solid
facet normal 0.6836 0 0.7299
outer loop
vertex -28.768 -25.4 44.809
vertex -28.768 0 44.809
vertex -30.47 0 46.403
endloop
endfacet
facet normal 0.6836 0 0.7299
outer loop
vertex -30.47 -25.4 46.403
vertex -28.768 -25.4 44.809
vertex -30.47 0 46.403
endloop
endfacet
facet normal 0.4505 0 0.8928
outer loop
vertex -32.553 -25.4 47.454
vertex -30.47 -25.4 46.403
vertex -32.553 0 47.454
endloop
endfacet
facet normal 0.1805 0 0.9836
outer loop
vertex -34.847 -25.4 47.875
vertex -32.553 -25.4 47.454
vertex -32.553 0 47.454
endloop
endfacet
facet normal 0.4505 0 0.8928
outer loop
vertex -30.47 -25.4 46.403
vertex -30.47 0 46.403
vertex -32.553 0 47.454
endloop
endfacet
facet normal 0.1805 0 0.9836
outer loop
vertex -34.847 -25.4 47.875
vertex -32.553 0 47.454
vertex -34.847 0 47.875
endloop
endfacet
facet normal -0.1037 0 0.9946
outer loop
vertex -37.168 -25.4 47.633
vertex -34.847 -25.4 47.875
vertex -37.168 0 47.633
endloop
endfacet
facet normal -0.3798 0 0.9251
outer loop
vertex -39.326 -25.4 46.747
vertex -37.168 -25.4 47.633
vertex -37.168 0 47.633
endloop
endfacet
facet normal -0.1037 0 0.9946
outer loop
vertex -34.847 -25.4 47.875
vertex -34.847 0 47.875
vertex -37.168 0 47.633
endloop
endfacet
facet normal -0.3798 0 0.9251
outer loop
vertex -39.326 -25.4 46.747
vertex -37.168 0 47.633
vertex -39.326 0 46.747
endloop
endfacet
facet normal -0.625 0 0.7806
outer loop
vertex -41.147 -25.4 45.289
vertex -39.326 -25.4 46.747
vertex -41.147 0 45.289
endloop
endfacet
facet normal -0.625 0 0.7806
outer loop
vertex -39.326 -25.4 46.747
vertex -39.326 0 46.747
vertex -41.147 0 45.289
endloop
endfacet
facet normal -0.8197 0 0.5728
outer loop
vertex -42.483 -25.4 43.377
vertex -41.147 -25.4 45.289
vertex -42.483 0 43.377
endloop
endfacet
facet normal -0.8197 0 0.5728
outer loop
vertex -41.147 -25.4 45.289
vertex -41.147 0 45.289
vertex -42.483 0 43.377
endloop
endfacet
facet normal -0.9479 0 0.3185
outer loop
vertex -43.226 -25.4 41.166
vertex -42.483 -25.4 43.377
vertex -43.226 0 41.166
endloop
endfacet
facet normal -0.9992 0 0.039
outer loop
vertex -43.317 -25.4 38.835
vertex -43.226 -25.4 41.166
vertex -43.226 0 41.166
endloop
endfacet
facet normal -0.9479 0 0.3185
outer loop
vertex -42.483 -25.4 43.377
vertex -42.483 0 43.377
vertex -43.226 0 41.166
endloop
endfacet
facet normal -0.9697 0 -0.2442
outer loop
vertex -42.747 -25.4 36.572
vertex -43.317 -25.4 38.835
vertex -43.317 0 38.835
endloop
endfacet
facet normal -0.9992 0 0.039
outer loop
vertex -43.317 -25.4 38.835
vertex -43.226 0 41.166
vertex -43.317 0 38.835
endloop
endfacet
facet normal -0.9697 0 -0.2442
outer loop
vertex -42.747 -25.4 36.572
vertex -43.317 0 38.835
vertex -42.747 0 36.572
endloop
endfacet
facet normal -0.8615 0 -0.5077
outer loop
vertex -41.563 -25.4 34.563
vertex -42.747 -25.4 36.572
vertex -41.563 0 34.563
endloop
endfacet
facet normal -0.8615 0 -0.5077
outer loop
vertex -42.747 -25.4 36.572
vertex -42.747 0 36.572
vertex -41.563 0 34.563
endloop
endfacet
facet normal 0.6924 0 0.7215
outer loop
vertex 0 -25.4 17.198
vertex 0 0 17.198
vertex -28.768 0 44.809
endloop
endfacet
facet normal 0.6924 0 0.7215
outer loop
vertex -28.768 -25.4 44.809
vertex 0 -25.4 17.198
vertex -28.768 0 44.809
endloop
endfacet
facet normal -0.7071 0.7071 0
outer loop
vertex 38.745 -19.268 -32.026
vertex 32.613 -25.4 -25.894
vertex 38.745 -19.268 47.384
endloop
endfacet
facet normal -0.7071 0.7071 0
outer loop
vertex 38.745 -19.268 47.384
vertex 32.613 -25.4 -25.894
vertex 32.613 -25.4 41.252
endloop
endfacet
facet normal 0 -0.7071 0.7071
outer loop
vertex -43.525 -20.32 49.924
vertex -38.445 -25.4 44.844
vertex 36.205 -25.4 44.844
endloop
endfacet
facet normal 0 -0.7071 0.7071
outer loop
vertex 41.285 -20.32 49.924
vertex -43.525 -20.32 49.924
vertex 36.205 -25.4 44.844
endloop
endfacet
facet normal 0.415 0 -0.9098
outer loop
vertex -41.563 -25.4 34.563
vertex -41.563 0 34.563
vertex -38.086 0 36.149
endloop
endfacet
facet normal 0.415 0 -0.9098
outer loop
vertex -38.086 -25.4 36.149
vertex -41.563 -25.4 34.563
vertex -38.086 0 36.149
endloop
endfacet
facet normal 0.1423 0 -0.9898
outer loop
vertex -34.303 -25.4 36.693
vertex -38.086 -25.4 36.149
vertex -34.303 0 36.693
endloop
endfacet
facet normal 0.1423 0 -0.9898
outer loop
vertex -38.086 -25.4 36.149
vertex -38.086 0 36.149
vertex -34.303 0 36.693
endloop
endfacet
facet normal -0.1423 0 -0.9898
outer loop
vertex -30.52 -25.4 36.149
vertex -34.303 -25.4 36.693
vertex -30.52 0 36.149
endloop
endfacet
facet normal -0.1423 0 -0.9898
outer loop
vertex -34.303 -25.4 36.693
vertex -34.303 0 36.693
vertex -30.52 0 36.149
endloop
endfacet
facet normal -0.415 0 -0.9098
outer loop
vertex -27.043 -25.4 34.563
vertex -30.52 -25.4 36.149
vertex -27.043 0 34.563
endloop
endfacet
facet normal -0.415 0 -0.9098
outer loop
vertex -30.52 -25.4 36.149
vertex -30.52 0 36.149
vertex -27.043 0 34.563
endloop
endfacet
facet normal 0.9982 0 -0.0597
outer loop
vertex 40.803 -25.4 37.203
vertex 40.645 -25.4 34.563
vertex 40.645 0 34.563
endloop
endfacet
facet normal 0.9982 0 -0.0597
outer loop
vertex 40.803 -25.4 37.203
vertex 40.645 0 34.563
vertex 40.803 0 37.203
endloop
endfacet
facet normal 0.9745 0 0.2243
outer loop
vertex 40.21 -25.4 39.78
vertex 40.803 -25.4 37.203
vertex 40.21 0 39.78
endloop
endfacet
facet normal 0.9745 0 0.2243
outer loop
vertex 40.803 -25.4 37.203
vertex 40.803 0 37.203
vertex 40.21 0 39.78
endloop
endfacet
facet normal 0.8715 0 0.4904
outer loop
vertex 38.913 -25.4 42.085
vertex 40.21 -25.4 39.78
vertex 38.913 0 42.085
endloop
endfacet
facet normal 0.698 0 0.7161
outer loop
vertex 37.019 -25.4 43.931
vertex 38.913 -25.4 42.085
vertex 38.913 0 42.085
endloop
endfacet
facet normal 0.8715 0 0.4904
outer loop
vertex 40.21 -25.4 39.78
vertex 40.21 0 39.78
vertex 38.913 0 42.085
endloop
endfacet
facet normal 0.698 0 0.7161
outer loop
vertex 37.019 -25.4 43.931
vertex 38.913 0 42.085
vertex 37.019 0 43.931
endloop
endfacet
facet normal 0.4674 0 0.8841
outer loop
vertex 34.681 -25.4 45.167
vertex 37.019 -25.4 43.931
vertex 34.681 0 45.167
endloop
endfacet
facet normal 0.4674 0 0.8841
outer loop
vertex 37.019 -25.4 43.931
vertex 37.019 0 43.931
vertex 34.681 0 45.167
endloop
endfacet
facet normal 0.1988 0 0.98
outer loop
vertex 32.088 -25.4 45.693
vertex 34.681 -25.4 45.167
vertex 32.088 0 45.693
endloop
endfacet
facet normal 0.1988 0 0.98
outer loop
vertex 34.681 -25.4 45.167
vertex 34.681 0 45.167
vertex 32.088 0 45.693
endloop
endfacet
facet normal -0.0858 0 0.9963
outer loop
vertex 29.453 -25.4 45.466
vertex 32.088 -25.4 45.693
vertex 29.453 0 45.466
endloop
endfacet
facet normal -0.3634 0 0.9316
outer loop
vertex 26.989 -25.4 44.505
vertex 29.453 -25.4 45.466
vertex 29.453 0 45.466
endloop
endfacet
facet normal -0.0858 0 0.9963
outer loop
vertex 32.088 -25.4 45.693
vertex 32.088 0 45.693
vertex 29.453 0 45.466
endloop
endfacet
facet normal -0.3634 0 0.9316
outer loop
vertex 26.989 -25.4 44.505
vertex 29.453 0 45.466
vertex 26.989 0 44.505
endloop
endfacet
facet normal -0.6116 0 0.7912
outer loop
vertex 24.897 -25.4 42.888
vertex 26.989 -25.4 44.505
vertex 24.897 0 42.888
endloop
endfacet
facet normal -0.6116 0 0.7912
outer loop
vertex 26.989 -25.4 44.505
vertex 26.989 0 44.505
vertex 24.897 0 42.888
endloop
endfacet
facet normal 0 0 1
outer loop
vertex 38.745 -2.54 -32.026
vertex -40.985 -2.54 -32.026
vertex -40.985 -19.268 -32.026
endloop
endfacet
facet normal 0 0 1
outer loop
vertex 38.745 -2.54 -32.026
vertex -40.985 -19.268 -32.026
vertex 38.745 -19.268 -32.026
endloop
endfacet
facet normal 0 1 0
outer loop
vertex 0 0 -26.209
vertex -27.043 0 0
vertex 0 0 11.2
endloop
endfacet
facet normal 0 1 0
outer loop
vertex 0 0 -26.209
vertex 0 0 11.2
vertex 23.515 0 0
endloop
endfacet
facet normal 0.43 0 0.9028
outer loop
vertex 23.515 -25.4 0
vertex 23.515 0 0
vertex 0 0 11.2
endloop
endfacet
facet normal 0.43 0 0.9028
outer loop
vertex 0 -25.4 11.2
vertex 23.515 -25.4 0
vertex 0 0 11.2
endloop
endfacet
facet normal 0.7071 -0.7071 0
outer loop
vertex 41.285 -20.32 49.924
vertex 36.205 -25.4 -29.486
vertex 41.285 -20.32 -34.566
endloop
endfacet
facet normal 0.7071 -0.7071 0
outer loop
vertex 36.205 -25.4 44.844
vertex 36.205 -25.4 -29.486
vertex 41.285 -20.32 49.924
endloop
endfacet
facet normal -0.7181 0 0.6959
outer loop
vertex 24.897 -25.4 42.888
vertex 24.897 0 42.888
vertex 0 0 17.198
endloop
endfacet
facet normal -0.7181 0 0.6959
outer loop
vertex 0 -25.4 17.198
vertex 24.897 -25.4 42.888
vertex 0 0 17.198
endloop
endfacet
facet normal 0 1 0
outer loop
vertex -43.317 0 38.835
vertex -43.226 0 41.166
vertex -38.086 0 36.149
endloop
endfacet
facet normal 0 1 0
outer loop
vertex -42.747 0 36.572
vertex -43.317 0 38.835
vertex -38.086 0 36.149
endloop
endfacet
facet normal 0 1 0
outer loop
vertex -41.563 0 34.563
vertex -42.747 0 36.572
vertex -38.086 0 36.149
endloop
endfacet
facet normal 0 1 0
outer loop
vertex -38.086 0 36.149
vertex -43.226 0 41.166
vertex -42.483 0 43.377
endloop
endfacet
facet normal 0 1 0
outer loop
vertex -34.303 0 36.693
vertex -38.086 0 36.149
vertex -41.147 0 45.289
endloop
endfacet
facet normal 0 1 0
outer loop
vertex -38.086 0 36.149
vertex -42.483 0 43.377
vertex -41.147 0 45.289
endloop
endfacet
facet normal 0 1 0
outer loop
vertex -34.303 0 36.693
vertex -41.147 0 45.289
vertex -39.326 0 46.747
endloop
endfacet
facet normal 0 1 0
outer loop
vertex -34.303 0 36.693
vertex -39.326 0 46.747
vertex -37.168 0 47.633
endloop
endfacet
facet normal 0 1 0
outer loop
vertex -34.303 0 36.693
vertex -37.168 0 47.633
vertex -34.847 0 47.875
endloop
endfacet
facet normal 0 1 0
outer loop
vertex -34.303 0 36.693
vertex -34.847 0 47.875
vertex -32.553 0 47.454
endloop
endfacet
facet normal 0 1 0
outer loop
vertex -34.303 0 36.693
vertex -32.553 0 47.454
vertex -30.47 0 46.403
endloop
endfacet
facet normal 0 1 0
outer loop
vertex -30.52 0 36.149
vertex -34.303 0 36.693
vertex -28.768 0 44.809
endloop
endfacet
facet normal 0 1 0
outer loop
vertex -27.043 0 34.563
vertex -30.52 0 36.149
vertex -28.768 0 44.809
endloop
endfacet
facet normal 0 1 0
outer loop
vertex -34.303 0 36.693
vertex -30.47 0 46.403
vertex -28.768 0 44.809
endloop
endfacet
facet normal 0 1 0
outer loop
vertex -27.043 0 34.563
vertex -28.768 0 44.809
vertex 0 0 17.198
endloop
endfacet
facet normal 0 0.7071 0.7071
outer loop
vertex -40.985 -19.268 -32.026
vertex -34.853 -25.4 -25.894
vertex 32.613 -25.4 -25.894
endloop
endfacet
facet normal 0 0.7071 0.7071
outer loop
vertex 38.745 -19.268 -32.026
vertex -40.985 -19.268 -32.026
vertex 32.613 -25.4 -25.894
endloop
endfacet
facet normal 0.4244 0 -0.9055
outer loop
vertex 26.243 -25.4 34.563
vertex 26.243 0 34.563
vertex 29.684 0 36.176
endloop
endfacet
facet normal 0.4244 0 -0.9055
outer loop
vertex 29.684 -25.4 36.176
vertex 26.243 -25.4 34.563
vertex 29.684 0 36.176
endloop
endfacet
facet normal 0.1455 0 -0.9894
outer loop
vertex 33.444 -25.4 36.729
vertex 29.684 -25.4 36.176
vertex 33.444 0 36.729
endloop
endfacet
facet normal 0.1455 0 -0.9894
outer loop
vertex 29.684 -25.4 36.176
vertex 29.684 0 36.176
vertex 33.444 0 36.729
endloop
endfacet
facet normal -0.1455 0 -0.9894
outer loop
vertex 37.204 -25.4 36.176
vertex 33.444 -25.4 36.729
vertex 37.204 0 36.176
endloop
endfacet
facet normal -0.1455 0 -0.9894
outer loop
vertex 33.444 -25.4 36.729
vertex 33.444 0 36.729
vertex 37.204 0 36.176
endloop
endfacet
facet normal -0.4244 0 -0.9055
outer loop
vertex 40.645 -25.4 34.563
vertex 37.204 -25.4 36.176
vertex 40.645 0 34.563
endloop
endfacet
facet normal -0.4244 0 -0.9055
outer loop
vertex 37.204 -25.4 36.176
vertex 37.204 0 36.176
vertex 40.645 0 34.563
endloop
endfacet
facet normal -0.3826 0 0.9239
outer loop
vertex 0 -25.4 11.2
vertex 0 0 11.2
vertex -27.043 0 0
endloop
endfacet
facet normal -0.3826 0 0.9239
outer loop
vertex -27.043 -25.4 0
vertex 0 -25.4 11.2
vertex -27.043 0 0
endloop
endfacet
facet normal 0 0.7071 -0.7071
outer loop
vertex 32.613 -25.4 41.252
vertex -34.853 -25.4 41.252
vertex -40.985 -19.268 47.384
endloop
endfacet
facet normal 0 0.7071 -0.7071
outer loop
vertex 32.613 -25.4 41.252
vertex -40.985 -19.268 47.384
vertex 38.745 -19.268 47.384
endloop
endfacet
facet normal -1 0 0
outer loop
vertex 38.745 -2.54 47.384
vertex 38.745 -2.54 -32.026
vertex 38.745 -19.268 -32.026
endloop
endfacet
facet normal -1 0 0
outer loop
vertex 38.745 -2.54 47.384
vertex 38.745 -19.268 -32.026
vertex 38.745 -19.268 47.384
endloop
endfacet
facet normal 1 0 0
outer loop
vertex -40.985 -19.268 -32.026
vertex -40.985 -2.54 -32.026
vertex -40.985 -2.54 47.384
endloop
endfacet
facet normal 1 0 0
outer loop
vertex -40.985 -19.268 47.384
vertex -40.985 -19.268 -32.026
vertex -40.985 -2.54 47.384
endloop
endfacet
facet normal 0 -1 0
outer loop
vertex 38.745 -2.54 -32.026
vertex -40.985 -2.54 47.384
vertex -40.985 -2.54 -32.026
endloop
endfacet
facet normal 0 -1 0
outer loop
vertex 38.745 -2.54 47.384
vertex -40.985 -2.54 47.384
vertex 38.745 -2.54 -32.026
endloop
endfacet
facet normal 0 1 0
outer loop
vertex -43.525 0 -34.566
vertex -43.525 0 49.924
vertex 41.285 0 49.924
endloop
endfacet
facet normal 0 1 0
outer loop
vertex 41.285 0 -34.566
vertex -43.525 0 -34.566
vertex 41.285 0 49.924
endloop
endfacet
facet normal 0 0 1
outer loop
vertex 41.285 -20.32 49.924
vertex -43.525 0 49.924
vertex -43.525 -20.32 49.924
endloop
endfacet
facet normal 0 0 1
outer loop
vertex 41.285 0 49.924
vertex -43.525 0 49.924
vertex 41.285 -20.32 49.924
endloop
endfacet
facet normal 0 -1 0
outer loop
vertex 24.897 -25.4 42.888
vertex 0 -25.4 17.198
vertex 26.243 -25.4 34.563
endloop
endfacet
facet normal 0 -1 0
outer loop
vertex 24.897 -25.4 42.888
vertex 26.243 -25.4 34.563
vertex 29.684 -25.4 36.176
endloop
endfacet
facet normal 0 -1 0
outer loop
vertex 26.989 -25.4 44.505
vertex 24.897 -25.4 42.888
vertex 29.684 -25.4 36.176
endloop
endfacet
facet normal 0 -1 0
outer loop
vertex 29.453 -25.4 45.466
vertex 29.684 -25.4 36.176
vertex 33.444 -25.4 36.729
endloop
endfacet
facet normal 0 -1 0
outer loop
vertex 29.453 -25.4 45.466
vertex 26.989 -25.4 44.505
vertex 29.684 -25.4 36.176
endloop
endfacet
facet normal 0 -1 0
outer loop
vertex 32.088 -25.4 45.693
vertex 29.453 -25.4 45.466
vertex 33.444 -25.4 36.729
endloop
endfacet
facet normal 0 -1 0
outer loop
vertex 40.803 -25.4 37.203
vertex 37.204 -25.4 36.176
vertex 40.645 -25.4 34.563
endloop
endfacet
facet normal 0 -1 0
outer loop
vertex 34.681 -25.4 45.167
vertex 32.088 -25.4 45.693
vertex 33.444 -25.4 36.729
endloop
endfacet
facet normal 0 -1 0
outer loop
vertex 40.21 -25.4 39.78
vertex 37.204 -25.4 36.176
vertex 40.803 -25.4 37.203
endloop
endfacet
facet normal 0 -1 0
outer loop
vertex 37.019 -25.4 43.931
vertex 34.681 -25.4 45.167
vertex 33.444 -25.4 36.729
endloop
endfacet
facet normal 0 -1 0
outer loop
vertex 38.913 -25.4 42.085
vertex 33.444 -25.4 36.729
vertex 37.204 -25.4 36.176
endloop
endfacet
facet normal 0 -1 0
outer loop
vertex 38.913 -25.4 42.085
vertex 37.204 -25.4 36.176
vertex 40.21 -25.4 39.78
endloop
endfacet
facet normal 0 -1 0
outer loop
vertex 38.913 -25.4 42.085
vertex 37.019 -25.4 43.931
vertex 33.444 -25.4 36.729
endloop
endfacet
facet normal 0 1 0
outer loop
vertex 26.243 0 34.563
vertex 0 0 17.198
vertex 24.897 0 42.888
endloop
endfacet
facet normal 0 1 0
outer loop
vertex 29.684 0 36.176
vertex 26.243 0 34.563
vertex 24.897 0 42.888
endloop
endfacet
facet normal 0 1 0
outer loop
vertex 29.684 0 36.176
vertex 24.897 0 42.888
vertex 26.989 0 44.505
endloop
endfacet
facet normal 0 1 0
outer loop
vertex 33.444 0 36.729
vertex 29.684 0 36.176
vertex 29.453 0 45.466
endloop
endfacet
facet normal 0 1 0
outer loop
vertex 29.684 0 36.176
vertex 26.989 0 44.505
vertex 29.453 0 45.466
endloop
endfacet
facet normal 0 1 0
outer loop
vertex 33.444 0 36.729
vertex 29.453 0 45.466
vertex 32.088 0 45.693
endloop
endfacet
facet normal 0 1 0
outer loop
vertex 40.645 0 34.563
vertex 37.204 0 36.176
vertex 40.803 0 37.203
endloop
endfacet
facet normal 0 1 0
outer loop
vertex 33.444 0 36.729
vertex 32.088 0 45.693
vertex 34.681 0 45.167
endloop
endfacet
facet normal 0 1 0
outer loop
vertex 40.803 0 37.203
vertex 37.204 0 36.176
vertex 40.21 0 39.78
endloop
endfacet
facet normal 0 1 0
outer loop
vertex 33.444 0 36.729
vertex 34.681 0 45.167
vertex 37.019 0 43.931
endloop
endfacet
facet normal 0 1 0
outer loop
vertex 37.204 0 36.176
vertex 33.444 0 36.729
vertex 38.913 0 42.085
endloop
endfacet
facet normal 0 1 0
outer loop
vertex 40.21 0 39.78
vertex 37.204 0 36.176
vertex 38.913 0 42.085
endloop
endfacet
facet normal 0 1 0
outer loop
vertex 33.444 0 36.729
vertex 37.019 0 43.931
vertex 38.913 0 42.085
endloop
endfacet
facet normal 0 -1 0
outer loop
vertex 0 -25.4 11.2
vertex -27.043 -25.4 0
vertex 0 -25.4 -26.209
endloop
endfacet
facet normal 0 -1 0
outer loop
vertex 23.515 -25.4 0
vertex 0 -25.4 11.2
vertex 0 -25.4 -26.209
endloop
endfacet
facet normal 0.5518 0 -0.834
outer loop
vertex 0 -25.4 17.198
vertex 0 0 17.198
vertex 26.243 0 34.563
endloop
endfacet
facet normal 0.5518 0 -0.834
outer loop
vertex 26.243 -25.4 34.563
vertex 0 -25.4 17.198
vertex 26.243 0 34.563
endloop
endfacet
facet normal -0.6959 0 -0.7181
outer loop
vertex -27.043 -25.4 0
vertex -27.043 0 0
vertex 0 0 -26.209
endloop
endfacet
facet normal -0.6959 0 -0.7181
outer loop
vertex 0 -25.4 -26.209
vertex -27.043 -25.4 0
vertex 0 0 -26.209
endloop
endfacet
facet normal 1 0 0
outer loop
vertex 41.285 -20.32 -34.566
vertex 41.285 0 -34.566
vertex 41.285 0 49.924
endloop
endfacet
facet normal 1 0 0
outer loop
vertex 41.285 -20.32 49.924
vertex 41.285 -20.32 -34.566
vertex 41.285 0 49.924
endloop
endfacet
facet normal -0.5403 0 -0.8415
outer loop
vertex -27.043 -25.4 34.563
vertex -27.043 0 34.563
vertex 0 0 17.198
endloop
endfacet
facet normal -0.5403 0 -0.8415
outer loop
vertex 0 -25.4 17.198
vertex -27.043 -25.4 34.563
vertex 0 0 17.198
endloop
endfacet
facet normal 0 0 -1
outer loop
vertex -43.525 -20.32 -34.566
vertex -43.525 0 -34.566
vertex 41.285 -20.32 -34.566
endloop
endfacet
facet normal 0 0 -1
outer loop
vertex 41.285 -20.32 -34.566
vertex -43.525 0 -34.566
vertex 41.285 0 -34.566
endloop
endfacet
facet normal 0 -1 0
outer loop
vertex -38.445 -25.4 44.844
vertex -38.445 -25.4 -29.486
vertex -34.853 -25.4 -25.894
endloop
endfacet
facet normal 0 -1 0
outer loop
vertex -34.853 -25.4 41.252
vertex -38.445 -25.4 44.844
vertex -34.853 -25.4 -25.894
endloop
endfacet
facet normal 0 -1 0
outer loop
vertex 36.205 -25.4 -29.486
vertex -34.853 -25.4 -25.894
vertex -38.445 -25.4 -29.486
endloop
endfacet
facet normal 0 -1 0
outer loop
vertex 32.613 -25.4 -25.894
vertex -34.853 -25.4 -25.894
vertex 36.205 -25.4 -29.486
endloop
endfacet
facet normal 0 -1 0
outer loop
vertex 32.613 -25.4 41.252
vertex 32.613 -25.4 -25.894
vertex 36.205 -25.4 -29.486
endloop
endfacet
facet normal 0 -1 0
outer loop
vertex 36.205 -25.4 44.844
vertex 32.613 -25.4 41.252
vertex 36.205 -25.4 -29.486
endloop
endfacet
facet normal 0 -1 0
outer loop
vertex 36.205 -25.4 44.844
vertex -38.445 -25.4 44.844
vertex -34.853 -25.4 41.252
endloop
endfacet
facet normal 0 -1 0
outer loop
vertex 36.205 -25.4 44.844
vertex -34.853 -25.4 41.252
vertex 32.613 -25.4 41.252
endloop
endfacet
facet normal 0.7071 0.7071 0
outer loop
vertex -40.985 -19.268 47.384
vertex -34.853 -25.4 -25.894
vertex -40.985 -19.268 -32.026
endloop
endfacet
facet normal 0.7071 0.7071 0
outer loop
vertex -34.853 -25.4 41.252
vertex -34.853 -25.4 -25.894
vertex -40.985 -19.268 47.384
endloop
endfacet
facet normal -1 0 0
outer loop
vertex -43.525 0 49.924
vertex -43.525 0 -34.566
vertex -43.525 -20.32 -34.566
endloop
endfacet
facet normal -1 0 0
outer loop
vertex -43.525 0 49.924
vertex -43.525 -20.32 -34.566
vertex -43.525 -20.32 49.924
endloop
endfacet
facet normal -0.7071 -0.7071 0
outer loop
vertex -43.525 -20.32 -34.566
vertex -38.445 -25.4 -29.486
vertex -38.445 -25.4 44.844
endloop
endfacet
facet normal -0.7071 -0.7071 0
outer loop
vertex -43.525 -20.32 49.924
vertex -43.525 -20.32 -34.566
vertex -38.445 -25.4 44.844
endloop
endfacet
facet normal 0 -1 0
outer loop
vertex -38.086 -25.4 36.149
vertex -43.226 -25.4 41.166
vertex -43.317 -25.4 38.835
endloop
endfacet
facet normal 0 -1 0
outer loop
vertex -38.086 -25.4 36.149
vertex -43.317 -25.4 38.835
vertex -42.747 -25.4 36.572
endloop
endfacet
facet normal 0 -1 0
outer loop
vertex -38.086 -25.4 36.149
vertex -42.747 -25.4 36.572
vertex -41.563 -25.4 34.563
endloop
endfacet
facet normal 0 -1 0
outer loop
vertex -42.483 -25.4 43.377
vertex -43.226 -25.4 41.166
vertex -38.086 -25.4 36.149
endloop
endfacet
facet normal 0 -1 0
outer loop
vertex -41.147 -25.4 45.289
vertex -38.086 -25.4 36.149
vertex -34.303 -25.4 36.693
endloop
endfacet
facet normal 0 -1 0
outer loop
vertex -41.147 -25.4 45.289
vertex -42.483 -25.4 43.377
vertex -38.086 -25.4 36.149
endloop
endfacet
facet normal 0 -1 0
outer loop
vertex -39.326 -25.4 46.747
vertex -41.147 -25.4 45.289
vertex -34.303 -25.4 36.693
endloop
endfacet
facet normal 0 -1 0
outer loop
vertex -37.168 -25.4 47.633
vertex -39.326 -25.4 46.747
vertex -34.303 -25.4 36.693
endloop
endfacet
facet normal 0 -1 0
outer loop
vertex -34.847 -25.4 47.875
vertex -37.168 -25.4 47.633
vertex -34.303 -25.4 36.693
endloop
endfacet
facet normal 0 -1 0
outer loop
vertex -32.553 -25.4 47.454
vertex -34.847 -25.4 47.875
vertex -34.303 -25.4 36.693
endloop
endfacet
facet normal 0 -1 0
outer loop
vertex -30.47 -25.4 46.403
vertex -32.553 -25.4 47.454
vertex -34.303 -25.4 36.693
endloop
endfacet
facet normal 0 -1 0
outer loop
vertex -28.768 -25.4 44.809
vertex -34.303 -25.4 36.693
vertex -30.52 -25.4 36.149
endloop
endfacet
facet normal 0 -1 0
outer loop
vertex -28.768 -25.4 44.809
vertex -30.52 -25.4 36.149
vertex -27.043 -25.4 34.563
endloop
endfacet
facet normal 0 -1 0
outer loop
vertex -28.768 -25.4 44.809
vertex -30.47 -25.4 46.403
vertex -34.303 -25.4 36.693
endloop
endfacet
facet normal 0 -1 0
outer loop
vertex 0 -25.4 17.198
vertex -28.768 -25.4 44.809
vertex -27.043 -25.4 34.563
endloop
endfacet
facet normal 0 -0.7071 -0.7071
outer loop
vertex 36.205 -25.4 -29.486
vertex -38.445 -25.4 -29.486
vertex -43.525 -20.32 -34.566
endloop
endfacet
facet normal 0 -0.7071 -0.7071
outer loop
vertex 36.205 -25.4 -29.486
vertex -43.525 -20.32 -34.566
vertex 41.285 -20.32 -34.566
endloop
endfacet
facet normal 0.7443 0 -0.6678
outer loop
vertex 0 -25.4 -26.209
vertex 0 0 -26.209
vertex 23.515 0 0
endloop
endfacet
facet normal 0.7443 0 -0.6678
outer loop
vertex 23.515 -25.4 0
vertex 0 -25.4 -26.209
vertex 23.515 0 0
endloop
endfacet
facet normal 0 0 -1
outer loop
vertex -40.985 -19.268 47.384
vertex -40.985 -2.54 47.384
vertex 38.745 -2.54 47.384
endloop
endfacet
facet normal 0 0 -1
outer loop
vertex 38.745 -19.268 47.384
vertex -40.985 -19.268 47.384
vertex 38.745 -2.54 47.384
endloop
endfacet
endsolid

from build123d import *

# Parameters (mm, degrees)
F2_DEPTH = 25.4
F1_W     = 84.8106071353
F1_H     = 84.4905599952
F3_SIZE  = 5.08
F4_T     = -2.54


with BuildPart() as f2:
    # F0 (on Front) → F2 (new body)
    with BuildSketch(Plane.XZ):
        Polygon((23.5154349893, 0), (0, 11.1995805055), (-27.0433817059, 0), (0, -26.2091394757), align=None)
    extrude(amount=F2_DEPTH)


with BuildPart() as f2b:
    # F0 (on Front) → F2, piece 2 (new body)
    with BuildSketch(Plane.XZ):
        with BuildLine():
            Line((0, 17.1983804844), (-28.7676450394, 44.8085343447))
            ThreePointArc((-28.7676450394, 44.8085343447), (-40.2881972418, 46.0830542588), (-41.5627171559, 34.5625020564))
            ThreePointArc((-41.5627171559, 34.5625020564), (-34.3030494309, 36.6925224262), (-27.0433817059, 34.5625020564))
            Line((-27.0433817059, 34.5625020564), (0, 17.1983804844))
        make_face()
    extrude(amount=F2_DEPTH)


with BuildPart() as f2c:
    # F0 (on Front) → F2, piece 3 (new body)
    with BuildSketch(Plane.XZ):
        with BuildLine():
            Line((24.8967199784, 42.8875681139), (0, 17.1983804844))
            Line((0, 17.1983804844), (26.2432787567, 34.5625020564))
            ThreePointArc((26.2432787567, 34.5625020564), (33.4441801533, 36.7291108135), (40.6450815499, 34.5625020564))
            ThreePointArc((40.6450815499, 34.5625020564), (35.8939367202, 44.632819972), (24.8967199784, 42.8875681139))
        make_face()
    extrude(amount=F2_DEPTH)


with BuildPart() as f2d:
    # F1 (on Front) → F2, piece 4 (new body)
    with BuildSketch(Plane.XZ):
        with Locations((-1.1201389134, 7.6791383326)):
            Rectangle(F1_W, F1_H)
    extrude(amount=F2_DEPTH)

    # F3
    f3_edges = [f2d.edges().sort_by_distance(p)[0] for p in [
        (-43.525442, -25.4, 7.679138),
        (-1.120139, -25.4, 49.924418),
        (41.285165, -25.4, 7.679138),
        (-1.120139, -25.4, -34.566142),
    ]]
    chamfer(f3_edges, length=F3_SIZE)

    # F4
    f4_openings = [f2d.faces().sort_by_distance(p)[0] for p in [
        (-1.120139, -25.4, 7.679138),
    ]]
    offset(amount=F4_T, openings=f4_openings, kind=Kind.INTERSECTION)


solid = Compound([f2.part, f2b.part, f2c.part, f2d.part])
